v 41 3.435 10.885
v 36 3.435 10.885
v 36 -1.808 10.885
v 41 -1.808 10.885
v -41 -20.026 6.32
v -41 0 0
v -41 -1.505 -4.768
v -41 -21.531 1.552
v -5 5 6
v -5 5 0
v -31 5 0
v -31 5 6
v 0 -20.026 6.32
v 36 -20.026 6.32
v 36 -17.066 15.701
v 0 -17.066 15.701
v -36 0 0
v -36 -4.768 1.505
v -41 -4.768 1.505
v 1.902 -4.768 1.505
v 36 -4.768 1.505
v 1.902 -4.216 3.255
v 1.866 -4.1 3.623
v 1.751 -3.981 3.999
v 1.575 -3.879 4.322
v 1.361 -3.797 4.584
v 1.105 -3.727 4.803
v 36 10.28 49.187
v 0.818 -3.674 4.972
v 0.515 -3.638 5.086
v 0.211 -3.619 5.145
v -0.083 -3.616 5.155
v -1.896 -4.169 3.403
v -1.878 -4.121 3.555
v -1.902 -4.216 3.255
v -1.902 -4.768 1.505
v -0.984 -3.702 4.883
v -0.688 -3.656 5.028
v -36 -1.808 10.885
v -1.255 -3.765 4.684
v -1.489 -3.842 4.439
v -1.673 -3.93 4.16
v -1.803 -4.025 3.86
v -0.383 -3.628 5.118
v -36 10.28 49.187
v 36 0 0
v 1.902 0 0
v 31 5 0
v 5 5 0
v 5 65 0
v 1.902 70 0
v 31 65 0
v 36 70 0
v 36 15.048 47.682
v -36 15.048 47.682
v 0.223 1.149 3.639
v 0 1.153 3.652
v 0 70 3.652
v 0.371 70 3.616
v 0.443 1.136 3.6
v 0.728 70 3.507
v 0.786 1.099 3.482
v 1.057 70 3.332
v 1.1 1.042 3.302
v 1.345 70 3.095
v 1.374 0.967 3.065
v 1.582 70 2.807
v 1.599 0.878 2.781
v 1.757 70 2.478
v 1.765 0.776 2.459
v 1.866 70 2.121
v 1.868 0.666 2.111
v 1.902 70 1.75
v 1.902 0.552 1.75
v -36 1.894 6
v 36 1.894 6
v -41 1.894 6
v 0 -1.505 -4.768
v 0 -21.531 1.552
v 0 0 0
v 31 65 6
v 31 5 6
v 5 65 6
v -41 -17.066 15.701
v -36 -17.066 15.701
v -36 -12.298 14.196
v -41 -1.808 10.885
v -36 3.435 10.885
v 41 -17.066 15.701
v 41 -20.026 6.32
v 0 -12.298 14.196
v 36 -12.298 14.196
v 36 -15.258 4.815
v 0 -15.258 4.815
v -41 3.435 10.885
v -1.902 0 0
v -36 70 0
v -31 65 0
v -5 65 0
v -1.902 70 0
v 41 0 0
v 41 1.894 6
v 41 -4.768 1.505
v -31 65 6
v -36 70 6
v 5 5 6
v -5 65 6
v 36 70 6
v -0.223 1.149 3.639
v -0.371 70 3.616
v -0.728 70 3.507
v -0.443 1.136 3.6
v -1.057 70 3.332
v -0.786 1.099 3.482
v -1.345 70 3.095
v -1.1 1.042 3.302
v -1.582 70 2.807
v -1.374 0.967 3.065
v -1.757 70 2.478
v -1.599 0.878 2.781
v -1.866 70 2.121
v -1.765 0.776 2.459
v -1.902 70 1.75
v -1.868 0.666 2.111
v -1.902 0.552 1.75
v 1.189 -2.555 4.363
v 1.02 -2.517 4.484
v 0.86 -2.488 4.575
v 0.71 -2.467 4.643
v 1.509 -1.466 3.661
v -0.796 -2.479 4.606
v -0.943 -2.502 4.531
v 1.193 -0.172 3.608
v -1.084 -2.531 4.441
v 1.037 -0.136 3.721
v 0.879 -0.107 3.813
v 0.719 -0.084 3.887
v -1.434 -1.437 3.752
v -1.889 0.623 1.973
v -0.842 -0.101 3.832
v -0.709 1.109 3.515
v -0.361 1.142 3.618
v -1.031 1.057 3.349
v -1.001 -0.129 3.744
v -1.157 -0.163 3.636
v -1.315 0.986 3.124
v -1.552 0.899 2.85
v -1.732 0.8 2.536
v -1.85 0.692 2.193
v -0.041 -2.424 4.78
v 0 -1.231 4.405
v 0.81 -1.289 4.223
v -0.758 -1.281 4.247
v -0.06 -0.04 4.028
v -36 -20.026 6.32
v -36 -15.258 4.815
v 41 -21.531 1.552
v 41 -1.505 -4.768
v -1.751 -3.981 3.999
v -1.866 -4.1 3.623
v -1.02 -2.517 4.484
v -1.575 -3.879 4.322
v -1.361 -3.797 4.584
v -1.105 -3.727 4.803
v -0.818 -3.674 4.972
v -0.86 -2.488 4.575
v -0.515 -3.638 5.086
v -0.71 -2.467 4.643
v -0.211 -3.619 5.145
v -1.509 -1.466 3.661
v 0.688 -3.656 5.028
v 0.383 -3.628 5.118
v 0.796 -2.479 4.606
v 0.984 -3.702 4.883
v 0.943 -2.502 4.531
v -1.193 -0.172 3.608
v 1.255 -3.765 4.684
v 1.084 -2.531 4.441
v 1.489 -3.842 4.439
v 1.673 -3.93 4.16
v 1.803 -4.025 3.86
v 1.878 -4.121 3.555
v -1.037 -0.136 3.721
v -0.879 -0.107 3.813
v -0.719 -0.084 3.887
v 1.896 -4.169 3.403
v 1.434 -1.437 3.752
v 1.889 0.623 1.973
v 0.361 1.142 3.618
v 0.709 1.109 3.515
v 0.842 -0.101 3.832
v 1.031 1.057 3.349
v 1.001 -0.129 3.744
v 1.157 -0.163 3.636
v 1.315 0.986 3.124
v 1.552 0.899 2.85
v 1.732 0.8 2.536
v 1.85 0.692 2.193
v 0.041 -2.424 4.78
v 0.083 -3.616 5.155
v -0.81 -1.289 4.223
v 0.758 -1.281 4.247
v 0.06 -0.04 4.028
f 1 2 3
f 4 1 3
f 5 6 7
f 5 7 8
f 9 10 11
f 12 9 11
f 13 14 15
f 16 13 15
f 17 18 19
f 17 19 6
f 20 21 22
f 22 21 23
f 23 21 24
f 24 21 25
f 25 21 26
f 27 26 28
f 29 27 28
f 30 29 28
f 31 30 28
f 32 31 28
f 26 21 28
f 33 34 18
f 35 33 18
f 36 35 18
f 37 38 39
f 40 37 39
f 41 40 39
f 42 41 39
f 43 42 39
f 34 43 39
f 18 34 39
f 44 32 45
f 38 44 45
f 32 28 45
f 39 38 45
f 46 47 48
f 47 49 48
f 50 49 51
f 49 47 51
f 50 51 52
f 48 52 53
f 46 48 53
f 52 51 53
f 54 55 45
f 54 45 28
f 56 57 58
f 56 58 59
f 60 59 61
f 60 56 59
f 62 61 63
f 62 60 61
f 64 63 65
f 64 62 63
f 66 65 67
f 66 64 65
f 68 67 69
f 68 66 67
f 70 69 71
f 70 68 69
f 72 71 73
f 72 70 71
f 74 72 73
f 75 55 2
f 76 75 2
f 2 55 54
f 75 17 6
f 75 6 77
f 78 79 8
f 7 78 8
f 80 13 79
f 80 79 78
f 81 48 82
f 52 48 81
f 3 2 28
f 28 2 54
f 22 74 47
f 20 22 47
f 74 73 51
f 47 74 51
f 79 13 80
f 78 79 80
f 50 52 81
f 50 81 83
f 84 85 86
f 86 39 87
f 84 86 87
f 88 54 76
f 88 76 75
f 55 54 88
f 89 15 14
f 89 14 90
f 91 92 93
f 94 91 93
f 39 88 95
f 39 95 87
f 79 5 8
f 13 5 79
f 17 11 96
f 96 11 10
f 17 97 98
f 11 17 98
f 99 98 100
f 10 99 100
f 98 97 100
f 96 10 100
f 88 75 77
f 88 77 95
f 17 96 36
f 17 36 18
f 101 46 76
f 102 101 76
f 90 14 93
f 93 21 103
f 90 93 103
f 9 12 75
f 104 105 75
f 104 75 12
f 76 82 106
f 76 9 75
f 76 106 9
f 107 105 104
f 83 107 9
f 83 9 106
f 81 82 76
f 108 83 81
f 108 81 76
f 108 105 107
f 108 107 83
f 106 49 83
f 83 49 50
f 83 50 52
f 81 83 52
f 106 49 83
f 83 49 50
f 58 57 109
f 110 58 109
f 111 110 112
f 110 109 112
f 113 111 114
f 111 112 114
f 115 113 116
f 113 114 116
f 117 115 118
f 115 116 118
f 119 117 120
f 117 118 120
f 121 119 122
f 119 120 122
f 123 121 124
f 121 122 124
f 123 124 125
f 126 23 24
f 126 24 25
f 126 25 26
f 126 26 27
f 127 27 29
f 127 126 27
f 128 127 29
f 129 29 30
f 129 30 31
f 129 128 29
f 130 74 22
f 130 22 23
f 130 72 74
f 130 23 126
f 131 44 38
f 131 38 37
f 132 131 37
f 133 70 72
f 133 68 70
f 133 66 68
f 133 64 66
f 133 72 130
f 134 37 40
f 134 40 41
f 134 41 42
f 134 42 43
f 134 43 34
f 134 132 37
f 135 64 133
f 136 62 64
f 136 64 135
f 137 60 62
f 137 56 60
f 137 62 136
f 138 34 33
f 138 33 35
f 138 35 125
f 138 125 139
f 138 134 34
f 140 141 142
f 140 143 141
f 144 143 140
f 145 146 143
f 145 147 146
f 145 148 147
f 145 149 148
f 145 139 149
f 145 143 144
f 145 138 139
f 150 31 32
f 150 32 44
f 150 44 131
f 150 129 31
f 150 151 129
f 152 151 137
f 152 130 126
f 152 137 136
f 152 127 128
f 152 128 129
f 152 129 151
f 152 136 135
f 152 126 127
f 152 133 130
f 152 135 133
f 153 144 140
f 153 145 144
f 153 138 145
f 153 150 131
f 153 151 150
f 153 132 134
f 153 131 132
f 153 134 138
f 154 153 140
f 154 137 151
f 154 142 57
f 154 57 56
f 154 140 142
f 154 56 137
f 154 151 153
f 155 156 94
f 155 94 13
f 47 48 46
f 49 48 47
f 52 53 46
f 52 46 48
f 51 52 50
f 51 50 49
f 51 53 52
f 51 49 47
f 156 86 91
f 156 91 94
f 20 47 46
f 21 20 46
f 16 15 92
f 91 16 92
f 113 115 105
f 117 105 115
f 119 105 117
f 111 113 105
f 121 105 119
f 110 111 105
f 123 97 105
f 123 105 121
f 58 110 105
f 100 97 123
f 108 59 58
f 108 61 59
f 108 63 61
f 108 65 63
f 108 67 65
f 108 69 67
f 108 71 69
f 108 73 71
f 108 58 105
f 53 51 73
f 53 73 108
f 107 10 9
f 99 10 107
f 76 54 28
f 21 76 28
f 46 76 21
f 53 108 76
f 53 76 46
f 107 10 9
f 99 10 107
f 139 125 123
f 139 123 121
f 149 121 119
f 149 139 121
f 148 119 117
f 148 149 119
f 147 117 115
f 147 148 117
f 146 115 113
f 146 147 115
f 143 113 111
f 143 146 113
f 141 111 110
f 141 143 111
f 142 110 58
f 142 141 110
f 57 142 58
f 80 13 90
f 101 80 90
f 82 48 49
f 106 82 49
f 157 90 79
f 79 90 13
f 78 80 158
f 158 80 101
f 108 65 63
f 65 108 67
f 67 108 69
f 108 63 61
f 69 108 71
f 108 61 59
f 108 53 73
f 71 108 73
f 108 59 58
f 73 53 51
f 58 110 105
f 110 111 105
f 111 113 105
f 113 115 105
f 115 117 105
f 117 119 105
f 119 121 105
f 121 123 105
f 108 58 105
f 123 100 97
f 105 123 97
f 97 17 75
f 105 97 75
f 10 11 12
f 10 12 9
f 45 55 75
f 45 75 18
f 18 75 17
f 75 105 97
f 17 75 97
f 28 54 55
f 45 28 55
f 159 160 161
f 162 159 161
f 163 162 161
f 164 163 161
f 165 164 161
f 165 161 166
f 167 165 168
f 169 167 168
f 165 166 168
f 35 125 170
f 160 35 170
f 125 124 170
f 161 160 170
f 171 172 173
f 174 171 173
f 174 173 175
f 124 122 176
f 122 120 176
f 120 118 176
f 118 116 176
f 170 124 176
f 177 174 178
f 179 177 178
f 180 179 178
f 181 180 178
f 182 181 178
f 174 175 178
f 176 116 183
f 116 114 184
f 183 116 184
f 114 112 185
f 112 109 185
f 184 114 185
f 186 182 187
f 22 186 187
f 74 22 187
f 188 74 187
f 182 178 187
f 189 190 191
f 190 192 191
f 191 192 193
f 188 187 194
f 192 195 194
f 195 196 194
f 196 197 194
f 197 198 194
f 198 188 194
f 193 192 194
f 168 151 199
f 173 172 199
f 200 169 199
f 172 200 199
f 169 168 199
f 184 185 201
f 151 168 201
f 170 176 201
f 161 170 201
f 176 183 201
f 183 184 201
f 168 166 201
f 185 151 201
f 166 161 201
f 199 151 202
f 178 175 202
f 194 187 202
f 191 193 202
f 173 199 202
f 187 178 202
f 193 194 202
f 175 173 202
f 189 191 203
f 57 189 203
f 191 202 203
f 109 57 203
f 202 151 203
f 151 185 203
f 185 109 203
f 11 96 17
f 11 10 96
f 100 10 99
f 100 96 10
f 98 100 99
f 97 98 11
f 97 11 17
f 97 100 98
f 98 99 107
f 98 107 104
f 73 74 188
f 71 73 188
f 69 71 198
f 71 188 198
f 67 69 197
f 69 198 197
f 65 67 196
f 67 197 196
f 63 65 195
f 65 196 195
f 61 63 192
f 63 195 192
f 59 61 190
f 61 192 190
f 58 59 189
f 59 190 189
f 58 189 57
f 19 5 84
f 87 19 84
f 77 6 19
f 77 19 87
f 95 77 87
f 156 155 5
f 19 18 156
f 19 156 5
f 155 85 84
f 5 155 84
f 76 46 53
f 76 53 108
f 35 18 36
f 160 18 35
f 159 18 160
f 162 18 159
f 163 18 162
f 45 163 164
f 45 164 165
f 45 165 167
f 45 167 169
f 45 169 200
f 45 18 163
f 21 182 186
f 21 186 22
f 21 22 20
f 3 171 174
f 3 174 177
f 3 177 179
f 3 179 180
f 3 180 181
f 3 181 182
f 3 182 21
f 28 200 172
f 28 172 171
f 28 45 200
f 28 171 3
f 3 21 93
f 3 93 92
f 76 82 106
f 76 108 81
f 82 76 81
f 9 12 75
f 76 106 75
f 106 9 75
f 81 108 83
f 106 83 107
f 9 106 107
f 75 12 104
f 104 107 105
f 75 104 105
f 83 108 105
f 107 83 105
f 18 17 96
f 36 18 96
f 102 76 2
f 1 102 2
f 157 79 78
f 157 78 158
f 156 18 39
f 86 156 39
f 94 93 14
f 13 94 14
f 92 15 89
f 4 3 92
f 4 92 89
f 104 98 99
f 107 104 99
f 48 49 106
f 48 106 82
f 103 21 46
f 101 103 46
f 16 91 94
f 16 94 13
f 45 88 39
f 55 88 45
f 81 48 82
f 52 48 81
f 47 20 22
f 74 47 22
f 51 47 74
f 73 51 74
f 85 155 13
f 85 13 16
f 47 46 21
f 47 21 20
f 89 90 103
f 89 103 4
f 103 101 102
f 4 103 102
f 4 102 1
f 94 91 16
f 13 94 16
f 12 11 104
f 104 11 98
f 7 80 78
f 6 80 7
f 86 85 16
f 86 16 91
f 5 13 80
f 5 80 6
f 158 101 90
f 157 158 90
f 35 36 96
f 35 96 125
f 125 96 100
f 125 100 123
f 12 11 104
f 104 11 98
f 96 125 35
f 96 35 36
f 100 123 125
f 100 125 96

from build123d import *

# Parameters (mm, degrees)
F0_W      = 26
F0_H      = 60
F1_DEPTH  = 6
F3_DEPTH  = 100
F5_DEPTH  = 75
F6_W      = 72
F6_H      = 43.7082803012
F7_DEPTH  = 5
F9_DEPTH  = 5
F10_W     = 5
F10_H     = 9.8364483956
F11_DEPTH = 16
F13_DEPTH = 36
F16_DEPTH = 5


with BuildPart() as f1:
    # F0 (on Top) → F1 (new body)
    with BuildSketch(Plane.XY):
        Polygon((-36, 0), (0, 0), (36, 0), (36, 70), (0, 70), (-36, 70), align=None)
        with Locations((-18, 35)):
            Rectangle(F0_W, F0_H, mode=Mode.SUBTRACT)
        with Locations((18, 35)):
            Rectangle(F0_W, F0_H, mode=Mode.SUBTRACT)
    extrude(amount=F1_DEPTH)

    # F2 (on face) → F3 (cut)
    with BuildSketch(Plane.XZ):
        with BuildLine():
            ThreePointArc((1.9022511578, 1.75), (1.3450946932, 3.0950946932), (0, 3.6522511578))
            ThreePointArc((0, 3.6522511578), (-1.3450946932, 3.0950946932), (-1.9022511578, 1.75))
            Line((-1.9022511578, 1.75), (-1.9022511578, 0))
            Line((-1.9022511578, 0), (1.9022511578, 0))
            Line((1.9022511578, 0), (1.9022511578, 1.75))
        make_face()
    extrude(amount=-F3_DEPTH, mode=Mode.SUBTRACT)

    # F4 (on face) → F5 (cut)
    with BuildSketch(Plane.YZ.offset(36)):
        Polygon((0, 6), (0, 0), (1.8936041743, 6), align=None)
    extrude(amount=-F5_DEPTH, mode=Mode.SUBTRACT)

    # F6 (on face) → F7 (join)
    with BuildSketch(Plane(origin=(0, 0, 0), x_dir=(1, 0, 0), z_dir=(0, -0.953634346, 0.300967663))):
        with Locations((0, 28.1458598494)):
            Rectangle(F6_W, F6_H)
        with BuildLine():
            Line((-36, 6.2917196988), (-36, 0))
            Line((-36, 0), (-1.9022511578, 0))
            Line((-1.9022511578, 0), (-1.9022511578, 1.8350849122))
            add(Edge.make_bspline(
                [(-1.9022511578, 1.8350849122), (-1.9022511578, 3.8298234258), (0, 3.8298234258), (1.9022511578, 3.8298234258), (1.9022511578, 1.8350849122)],
                knots=[1.5707963268, 1.5707963268, 1.5707963268, 3.1415926536, 3.1415926536, 4.7123889804, 4.7123889804, 4.7123889804], degree=2, weights=[1, 0.7071067812, 1, 0.7071067812, 1]))
            Line((1.9022511578, 1.8350849122), (1.9022511578, 0))
            Line((1.9022511578, 0), (36, 0))
            Line((36, 0), (36, 6.2917196988))
            Line((36, 6.2917196988), (-36, 6.2917196988))
        make_face()
    extrude(amount=F7_DEPTH)

    # F8 (on face) → F9 (join)
    with BuildSketch(Plane.YZ.offset(36)):
        Polygon((3.4353809054, 10.8852133476), (-1.8077188436, 10.8852133476), (-4.7681717298, 1.5048383152), (0, 0), (1.8936041743, 6), align=None)
    extrude(amount=F9_DEPTH)

    # F10 (on face) → F11 (join)
    with BuildSketch(Plane(origin=(0, -4.7681717298, 1.5048383152), x_dir=(1, 0, 0), z_dir=(0, -0.953634346, 0.300967663))):
        with Locations((38.5, 4.9182241978)):
            Rectangle(F10_W, F10_H)
    extrude(amount=F11_DEPTH)

    # F12 (on face) → F13 (join)
    with BuildSketch(Plane(origin=(36, 0, 0), x_dir=(0, -1, 0), z_dir=(-1, 0, 0))):
        Polygon((20.0263212653, 6.3203209238), (17.065868379, 15.7006959562), (12.2976966492, 14.195857641), (15.2581495354, 4.8154826086), align=None)
    extrude(amount=F13_DEPTH)


with BuildPart() as f14_1:
    # F14: instance of F1
    add(f1.part.mirror(Plane.YZ))


with BuildPart() as f16:
    # F15 (on face) → F16 (new body)
    with BuildSketch(Plane(origin=(0, 0, 0), x_dir=(1, 0, 0), z_dir=(0, -0.300967663, -0.953634346))):
        Polygon((41, 21), (0, 21), (0, 16), (36, 16), (36, 5), (1.9022511578, 5), (1.9022511578, 0), (3.5025123507, 0), (36, 0), (41, 0), align=None)
        Polygon((36, 16), (0, 16), (0, 0), (1.9022511578, 0), (1.9022511578, 5), (36, 5), align=None)
    extrude(amount=F16_DEPTH)


with BuildPart() as f17_1:
    # F17: instance of F16
    add(f16.part.mirror(Plane.YZ))


solid = Compound([f1.part, f14_1.part, f16.part, f17_1.part])
